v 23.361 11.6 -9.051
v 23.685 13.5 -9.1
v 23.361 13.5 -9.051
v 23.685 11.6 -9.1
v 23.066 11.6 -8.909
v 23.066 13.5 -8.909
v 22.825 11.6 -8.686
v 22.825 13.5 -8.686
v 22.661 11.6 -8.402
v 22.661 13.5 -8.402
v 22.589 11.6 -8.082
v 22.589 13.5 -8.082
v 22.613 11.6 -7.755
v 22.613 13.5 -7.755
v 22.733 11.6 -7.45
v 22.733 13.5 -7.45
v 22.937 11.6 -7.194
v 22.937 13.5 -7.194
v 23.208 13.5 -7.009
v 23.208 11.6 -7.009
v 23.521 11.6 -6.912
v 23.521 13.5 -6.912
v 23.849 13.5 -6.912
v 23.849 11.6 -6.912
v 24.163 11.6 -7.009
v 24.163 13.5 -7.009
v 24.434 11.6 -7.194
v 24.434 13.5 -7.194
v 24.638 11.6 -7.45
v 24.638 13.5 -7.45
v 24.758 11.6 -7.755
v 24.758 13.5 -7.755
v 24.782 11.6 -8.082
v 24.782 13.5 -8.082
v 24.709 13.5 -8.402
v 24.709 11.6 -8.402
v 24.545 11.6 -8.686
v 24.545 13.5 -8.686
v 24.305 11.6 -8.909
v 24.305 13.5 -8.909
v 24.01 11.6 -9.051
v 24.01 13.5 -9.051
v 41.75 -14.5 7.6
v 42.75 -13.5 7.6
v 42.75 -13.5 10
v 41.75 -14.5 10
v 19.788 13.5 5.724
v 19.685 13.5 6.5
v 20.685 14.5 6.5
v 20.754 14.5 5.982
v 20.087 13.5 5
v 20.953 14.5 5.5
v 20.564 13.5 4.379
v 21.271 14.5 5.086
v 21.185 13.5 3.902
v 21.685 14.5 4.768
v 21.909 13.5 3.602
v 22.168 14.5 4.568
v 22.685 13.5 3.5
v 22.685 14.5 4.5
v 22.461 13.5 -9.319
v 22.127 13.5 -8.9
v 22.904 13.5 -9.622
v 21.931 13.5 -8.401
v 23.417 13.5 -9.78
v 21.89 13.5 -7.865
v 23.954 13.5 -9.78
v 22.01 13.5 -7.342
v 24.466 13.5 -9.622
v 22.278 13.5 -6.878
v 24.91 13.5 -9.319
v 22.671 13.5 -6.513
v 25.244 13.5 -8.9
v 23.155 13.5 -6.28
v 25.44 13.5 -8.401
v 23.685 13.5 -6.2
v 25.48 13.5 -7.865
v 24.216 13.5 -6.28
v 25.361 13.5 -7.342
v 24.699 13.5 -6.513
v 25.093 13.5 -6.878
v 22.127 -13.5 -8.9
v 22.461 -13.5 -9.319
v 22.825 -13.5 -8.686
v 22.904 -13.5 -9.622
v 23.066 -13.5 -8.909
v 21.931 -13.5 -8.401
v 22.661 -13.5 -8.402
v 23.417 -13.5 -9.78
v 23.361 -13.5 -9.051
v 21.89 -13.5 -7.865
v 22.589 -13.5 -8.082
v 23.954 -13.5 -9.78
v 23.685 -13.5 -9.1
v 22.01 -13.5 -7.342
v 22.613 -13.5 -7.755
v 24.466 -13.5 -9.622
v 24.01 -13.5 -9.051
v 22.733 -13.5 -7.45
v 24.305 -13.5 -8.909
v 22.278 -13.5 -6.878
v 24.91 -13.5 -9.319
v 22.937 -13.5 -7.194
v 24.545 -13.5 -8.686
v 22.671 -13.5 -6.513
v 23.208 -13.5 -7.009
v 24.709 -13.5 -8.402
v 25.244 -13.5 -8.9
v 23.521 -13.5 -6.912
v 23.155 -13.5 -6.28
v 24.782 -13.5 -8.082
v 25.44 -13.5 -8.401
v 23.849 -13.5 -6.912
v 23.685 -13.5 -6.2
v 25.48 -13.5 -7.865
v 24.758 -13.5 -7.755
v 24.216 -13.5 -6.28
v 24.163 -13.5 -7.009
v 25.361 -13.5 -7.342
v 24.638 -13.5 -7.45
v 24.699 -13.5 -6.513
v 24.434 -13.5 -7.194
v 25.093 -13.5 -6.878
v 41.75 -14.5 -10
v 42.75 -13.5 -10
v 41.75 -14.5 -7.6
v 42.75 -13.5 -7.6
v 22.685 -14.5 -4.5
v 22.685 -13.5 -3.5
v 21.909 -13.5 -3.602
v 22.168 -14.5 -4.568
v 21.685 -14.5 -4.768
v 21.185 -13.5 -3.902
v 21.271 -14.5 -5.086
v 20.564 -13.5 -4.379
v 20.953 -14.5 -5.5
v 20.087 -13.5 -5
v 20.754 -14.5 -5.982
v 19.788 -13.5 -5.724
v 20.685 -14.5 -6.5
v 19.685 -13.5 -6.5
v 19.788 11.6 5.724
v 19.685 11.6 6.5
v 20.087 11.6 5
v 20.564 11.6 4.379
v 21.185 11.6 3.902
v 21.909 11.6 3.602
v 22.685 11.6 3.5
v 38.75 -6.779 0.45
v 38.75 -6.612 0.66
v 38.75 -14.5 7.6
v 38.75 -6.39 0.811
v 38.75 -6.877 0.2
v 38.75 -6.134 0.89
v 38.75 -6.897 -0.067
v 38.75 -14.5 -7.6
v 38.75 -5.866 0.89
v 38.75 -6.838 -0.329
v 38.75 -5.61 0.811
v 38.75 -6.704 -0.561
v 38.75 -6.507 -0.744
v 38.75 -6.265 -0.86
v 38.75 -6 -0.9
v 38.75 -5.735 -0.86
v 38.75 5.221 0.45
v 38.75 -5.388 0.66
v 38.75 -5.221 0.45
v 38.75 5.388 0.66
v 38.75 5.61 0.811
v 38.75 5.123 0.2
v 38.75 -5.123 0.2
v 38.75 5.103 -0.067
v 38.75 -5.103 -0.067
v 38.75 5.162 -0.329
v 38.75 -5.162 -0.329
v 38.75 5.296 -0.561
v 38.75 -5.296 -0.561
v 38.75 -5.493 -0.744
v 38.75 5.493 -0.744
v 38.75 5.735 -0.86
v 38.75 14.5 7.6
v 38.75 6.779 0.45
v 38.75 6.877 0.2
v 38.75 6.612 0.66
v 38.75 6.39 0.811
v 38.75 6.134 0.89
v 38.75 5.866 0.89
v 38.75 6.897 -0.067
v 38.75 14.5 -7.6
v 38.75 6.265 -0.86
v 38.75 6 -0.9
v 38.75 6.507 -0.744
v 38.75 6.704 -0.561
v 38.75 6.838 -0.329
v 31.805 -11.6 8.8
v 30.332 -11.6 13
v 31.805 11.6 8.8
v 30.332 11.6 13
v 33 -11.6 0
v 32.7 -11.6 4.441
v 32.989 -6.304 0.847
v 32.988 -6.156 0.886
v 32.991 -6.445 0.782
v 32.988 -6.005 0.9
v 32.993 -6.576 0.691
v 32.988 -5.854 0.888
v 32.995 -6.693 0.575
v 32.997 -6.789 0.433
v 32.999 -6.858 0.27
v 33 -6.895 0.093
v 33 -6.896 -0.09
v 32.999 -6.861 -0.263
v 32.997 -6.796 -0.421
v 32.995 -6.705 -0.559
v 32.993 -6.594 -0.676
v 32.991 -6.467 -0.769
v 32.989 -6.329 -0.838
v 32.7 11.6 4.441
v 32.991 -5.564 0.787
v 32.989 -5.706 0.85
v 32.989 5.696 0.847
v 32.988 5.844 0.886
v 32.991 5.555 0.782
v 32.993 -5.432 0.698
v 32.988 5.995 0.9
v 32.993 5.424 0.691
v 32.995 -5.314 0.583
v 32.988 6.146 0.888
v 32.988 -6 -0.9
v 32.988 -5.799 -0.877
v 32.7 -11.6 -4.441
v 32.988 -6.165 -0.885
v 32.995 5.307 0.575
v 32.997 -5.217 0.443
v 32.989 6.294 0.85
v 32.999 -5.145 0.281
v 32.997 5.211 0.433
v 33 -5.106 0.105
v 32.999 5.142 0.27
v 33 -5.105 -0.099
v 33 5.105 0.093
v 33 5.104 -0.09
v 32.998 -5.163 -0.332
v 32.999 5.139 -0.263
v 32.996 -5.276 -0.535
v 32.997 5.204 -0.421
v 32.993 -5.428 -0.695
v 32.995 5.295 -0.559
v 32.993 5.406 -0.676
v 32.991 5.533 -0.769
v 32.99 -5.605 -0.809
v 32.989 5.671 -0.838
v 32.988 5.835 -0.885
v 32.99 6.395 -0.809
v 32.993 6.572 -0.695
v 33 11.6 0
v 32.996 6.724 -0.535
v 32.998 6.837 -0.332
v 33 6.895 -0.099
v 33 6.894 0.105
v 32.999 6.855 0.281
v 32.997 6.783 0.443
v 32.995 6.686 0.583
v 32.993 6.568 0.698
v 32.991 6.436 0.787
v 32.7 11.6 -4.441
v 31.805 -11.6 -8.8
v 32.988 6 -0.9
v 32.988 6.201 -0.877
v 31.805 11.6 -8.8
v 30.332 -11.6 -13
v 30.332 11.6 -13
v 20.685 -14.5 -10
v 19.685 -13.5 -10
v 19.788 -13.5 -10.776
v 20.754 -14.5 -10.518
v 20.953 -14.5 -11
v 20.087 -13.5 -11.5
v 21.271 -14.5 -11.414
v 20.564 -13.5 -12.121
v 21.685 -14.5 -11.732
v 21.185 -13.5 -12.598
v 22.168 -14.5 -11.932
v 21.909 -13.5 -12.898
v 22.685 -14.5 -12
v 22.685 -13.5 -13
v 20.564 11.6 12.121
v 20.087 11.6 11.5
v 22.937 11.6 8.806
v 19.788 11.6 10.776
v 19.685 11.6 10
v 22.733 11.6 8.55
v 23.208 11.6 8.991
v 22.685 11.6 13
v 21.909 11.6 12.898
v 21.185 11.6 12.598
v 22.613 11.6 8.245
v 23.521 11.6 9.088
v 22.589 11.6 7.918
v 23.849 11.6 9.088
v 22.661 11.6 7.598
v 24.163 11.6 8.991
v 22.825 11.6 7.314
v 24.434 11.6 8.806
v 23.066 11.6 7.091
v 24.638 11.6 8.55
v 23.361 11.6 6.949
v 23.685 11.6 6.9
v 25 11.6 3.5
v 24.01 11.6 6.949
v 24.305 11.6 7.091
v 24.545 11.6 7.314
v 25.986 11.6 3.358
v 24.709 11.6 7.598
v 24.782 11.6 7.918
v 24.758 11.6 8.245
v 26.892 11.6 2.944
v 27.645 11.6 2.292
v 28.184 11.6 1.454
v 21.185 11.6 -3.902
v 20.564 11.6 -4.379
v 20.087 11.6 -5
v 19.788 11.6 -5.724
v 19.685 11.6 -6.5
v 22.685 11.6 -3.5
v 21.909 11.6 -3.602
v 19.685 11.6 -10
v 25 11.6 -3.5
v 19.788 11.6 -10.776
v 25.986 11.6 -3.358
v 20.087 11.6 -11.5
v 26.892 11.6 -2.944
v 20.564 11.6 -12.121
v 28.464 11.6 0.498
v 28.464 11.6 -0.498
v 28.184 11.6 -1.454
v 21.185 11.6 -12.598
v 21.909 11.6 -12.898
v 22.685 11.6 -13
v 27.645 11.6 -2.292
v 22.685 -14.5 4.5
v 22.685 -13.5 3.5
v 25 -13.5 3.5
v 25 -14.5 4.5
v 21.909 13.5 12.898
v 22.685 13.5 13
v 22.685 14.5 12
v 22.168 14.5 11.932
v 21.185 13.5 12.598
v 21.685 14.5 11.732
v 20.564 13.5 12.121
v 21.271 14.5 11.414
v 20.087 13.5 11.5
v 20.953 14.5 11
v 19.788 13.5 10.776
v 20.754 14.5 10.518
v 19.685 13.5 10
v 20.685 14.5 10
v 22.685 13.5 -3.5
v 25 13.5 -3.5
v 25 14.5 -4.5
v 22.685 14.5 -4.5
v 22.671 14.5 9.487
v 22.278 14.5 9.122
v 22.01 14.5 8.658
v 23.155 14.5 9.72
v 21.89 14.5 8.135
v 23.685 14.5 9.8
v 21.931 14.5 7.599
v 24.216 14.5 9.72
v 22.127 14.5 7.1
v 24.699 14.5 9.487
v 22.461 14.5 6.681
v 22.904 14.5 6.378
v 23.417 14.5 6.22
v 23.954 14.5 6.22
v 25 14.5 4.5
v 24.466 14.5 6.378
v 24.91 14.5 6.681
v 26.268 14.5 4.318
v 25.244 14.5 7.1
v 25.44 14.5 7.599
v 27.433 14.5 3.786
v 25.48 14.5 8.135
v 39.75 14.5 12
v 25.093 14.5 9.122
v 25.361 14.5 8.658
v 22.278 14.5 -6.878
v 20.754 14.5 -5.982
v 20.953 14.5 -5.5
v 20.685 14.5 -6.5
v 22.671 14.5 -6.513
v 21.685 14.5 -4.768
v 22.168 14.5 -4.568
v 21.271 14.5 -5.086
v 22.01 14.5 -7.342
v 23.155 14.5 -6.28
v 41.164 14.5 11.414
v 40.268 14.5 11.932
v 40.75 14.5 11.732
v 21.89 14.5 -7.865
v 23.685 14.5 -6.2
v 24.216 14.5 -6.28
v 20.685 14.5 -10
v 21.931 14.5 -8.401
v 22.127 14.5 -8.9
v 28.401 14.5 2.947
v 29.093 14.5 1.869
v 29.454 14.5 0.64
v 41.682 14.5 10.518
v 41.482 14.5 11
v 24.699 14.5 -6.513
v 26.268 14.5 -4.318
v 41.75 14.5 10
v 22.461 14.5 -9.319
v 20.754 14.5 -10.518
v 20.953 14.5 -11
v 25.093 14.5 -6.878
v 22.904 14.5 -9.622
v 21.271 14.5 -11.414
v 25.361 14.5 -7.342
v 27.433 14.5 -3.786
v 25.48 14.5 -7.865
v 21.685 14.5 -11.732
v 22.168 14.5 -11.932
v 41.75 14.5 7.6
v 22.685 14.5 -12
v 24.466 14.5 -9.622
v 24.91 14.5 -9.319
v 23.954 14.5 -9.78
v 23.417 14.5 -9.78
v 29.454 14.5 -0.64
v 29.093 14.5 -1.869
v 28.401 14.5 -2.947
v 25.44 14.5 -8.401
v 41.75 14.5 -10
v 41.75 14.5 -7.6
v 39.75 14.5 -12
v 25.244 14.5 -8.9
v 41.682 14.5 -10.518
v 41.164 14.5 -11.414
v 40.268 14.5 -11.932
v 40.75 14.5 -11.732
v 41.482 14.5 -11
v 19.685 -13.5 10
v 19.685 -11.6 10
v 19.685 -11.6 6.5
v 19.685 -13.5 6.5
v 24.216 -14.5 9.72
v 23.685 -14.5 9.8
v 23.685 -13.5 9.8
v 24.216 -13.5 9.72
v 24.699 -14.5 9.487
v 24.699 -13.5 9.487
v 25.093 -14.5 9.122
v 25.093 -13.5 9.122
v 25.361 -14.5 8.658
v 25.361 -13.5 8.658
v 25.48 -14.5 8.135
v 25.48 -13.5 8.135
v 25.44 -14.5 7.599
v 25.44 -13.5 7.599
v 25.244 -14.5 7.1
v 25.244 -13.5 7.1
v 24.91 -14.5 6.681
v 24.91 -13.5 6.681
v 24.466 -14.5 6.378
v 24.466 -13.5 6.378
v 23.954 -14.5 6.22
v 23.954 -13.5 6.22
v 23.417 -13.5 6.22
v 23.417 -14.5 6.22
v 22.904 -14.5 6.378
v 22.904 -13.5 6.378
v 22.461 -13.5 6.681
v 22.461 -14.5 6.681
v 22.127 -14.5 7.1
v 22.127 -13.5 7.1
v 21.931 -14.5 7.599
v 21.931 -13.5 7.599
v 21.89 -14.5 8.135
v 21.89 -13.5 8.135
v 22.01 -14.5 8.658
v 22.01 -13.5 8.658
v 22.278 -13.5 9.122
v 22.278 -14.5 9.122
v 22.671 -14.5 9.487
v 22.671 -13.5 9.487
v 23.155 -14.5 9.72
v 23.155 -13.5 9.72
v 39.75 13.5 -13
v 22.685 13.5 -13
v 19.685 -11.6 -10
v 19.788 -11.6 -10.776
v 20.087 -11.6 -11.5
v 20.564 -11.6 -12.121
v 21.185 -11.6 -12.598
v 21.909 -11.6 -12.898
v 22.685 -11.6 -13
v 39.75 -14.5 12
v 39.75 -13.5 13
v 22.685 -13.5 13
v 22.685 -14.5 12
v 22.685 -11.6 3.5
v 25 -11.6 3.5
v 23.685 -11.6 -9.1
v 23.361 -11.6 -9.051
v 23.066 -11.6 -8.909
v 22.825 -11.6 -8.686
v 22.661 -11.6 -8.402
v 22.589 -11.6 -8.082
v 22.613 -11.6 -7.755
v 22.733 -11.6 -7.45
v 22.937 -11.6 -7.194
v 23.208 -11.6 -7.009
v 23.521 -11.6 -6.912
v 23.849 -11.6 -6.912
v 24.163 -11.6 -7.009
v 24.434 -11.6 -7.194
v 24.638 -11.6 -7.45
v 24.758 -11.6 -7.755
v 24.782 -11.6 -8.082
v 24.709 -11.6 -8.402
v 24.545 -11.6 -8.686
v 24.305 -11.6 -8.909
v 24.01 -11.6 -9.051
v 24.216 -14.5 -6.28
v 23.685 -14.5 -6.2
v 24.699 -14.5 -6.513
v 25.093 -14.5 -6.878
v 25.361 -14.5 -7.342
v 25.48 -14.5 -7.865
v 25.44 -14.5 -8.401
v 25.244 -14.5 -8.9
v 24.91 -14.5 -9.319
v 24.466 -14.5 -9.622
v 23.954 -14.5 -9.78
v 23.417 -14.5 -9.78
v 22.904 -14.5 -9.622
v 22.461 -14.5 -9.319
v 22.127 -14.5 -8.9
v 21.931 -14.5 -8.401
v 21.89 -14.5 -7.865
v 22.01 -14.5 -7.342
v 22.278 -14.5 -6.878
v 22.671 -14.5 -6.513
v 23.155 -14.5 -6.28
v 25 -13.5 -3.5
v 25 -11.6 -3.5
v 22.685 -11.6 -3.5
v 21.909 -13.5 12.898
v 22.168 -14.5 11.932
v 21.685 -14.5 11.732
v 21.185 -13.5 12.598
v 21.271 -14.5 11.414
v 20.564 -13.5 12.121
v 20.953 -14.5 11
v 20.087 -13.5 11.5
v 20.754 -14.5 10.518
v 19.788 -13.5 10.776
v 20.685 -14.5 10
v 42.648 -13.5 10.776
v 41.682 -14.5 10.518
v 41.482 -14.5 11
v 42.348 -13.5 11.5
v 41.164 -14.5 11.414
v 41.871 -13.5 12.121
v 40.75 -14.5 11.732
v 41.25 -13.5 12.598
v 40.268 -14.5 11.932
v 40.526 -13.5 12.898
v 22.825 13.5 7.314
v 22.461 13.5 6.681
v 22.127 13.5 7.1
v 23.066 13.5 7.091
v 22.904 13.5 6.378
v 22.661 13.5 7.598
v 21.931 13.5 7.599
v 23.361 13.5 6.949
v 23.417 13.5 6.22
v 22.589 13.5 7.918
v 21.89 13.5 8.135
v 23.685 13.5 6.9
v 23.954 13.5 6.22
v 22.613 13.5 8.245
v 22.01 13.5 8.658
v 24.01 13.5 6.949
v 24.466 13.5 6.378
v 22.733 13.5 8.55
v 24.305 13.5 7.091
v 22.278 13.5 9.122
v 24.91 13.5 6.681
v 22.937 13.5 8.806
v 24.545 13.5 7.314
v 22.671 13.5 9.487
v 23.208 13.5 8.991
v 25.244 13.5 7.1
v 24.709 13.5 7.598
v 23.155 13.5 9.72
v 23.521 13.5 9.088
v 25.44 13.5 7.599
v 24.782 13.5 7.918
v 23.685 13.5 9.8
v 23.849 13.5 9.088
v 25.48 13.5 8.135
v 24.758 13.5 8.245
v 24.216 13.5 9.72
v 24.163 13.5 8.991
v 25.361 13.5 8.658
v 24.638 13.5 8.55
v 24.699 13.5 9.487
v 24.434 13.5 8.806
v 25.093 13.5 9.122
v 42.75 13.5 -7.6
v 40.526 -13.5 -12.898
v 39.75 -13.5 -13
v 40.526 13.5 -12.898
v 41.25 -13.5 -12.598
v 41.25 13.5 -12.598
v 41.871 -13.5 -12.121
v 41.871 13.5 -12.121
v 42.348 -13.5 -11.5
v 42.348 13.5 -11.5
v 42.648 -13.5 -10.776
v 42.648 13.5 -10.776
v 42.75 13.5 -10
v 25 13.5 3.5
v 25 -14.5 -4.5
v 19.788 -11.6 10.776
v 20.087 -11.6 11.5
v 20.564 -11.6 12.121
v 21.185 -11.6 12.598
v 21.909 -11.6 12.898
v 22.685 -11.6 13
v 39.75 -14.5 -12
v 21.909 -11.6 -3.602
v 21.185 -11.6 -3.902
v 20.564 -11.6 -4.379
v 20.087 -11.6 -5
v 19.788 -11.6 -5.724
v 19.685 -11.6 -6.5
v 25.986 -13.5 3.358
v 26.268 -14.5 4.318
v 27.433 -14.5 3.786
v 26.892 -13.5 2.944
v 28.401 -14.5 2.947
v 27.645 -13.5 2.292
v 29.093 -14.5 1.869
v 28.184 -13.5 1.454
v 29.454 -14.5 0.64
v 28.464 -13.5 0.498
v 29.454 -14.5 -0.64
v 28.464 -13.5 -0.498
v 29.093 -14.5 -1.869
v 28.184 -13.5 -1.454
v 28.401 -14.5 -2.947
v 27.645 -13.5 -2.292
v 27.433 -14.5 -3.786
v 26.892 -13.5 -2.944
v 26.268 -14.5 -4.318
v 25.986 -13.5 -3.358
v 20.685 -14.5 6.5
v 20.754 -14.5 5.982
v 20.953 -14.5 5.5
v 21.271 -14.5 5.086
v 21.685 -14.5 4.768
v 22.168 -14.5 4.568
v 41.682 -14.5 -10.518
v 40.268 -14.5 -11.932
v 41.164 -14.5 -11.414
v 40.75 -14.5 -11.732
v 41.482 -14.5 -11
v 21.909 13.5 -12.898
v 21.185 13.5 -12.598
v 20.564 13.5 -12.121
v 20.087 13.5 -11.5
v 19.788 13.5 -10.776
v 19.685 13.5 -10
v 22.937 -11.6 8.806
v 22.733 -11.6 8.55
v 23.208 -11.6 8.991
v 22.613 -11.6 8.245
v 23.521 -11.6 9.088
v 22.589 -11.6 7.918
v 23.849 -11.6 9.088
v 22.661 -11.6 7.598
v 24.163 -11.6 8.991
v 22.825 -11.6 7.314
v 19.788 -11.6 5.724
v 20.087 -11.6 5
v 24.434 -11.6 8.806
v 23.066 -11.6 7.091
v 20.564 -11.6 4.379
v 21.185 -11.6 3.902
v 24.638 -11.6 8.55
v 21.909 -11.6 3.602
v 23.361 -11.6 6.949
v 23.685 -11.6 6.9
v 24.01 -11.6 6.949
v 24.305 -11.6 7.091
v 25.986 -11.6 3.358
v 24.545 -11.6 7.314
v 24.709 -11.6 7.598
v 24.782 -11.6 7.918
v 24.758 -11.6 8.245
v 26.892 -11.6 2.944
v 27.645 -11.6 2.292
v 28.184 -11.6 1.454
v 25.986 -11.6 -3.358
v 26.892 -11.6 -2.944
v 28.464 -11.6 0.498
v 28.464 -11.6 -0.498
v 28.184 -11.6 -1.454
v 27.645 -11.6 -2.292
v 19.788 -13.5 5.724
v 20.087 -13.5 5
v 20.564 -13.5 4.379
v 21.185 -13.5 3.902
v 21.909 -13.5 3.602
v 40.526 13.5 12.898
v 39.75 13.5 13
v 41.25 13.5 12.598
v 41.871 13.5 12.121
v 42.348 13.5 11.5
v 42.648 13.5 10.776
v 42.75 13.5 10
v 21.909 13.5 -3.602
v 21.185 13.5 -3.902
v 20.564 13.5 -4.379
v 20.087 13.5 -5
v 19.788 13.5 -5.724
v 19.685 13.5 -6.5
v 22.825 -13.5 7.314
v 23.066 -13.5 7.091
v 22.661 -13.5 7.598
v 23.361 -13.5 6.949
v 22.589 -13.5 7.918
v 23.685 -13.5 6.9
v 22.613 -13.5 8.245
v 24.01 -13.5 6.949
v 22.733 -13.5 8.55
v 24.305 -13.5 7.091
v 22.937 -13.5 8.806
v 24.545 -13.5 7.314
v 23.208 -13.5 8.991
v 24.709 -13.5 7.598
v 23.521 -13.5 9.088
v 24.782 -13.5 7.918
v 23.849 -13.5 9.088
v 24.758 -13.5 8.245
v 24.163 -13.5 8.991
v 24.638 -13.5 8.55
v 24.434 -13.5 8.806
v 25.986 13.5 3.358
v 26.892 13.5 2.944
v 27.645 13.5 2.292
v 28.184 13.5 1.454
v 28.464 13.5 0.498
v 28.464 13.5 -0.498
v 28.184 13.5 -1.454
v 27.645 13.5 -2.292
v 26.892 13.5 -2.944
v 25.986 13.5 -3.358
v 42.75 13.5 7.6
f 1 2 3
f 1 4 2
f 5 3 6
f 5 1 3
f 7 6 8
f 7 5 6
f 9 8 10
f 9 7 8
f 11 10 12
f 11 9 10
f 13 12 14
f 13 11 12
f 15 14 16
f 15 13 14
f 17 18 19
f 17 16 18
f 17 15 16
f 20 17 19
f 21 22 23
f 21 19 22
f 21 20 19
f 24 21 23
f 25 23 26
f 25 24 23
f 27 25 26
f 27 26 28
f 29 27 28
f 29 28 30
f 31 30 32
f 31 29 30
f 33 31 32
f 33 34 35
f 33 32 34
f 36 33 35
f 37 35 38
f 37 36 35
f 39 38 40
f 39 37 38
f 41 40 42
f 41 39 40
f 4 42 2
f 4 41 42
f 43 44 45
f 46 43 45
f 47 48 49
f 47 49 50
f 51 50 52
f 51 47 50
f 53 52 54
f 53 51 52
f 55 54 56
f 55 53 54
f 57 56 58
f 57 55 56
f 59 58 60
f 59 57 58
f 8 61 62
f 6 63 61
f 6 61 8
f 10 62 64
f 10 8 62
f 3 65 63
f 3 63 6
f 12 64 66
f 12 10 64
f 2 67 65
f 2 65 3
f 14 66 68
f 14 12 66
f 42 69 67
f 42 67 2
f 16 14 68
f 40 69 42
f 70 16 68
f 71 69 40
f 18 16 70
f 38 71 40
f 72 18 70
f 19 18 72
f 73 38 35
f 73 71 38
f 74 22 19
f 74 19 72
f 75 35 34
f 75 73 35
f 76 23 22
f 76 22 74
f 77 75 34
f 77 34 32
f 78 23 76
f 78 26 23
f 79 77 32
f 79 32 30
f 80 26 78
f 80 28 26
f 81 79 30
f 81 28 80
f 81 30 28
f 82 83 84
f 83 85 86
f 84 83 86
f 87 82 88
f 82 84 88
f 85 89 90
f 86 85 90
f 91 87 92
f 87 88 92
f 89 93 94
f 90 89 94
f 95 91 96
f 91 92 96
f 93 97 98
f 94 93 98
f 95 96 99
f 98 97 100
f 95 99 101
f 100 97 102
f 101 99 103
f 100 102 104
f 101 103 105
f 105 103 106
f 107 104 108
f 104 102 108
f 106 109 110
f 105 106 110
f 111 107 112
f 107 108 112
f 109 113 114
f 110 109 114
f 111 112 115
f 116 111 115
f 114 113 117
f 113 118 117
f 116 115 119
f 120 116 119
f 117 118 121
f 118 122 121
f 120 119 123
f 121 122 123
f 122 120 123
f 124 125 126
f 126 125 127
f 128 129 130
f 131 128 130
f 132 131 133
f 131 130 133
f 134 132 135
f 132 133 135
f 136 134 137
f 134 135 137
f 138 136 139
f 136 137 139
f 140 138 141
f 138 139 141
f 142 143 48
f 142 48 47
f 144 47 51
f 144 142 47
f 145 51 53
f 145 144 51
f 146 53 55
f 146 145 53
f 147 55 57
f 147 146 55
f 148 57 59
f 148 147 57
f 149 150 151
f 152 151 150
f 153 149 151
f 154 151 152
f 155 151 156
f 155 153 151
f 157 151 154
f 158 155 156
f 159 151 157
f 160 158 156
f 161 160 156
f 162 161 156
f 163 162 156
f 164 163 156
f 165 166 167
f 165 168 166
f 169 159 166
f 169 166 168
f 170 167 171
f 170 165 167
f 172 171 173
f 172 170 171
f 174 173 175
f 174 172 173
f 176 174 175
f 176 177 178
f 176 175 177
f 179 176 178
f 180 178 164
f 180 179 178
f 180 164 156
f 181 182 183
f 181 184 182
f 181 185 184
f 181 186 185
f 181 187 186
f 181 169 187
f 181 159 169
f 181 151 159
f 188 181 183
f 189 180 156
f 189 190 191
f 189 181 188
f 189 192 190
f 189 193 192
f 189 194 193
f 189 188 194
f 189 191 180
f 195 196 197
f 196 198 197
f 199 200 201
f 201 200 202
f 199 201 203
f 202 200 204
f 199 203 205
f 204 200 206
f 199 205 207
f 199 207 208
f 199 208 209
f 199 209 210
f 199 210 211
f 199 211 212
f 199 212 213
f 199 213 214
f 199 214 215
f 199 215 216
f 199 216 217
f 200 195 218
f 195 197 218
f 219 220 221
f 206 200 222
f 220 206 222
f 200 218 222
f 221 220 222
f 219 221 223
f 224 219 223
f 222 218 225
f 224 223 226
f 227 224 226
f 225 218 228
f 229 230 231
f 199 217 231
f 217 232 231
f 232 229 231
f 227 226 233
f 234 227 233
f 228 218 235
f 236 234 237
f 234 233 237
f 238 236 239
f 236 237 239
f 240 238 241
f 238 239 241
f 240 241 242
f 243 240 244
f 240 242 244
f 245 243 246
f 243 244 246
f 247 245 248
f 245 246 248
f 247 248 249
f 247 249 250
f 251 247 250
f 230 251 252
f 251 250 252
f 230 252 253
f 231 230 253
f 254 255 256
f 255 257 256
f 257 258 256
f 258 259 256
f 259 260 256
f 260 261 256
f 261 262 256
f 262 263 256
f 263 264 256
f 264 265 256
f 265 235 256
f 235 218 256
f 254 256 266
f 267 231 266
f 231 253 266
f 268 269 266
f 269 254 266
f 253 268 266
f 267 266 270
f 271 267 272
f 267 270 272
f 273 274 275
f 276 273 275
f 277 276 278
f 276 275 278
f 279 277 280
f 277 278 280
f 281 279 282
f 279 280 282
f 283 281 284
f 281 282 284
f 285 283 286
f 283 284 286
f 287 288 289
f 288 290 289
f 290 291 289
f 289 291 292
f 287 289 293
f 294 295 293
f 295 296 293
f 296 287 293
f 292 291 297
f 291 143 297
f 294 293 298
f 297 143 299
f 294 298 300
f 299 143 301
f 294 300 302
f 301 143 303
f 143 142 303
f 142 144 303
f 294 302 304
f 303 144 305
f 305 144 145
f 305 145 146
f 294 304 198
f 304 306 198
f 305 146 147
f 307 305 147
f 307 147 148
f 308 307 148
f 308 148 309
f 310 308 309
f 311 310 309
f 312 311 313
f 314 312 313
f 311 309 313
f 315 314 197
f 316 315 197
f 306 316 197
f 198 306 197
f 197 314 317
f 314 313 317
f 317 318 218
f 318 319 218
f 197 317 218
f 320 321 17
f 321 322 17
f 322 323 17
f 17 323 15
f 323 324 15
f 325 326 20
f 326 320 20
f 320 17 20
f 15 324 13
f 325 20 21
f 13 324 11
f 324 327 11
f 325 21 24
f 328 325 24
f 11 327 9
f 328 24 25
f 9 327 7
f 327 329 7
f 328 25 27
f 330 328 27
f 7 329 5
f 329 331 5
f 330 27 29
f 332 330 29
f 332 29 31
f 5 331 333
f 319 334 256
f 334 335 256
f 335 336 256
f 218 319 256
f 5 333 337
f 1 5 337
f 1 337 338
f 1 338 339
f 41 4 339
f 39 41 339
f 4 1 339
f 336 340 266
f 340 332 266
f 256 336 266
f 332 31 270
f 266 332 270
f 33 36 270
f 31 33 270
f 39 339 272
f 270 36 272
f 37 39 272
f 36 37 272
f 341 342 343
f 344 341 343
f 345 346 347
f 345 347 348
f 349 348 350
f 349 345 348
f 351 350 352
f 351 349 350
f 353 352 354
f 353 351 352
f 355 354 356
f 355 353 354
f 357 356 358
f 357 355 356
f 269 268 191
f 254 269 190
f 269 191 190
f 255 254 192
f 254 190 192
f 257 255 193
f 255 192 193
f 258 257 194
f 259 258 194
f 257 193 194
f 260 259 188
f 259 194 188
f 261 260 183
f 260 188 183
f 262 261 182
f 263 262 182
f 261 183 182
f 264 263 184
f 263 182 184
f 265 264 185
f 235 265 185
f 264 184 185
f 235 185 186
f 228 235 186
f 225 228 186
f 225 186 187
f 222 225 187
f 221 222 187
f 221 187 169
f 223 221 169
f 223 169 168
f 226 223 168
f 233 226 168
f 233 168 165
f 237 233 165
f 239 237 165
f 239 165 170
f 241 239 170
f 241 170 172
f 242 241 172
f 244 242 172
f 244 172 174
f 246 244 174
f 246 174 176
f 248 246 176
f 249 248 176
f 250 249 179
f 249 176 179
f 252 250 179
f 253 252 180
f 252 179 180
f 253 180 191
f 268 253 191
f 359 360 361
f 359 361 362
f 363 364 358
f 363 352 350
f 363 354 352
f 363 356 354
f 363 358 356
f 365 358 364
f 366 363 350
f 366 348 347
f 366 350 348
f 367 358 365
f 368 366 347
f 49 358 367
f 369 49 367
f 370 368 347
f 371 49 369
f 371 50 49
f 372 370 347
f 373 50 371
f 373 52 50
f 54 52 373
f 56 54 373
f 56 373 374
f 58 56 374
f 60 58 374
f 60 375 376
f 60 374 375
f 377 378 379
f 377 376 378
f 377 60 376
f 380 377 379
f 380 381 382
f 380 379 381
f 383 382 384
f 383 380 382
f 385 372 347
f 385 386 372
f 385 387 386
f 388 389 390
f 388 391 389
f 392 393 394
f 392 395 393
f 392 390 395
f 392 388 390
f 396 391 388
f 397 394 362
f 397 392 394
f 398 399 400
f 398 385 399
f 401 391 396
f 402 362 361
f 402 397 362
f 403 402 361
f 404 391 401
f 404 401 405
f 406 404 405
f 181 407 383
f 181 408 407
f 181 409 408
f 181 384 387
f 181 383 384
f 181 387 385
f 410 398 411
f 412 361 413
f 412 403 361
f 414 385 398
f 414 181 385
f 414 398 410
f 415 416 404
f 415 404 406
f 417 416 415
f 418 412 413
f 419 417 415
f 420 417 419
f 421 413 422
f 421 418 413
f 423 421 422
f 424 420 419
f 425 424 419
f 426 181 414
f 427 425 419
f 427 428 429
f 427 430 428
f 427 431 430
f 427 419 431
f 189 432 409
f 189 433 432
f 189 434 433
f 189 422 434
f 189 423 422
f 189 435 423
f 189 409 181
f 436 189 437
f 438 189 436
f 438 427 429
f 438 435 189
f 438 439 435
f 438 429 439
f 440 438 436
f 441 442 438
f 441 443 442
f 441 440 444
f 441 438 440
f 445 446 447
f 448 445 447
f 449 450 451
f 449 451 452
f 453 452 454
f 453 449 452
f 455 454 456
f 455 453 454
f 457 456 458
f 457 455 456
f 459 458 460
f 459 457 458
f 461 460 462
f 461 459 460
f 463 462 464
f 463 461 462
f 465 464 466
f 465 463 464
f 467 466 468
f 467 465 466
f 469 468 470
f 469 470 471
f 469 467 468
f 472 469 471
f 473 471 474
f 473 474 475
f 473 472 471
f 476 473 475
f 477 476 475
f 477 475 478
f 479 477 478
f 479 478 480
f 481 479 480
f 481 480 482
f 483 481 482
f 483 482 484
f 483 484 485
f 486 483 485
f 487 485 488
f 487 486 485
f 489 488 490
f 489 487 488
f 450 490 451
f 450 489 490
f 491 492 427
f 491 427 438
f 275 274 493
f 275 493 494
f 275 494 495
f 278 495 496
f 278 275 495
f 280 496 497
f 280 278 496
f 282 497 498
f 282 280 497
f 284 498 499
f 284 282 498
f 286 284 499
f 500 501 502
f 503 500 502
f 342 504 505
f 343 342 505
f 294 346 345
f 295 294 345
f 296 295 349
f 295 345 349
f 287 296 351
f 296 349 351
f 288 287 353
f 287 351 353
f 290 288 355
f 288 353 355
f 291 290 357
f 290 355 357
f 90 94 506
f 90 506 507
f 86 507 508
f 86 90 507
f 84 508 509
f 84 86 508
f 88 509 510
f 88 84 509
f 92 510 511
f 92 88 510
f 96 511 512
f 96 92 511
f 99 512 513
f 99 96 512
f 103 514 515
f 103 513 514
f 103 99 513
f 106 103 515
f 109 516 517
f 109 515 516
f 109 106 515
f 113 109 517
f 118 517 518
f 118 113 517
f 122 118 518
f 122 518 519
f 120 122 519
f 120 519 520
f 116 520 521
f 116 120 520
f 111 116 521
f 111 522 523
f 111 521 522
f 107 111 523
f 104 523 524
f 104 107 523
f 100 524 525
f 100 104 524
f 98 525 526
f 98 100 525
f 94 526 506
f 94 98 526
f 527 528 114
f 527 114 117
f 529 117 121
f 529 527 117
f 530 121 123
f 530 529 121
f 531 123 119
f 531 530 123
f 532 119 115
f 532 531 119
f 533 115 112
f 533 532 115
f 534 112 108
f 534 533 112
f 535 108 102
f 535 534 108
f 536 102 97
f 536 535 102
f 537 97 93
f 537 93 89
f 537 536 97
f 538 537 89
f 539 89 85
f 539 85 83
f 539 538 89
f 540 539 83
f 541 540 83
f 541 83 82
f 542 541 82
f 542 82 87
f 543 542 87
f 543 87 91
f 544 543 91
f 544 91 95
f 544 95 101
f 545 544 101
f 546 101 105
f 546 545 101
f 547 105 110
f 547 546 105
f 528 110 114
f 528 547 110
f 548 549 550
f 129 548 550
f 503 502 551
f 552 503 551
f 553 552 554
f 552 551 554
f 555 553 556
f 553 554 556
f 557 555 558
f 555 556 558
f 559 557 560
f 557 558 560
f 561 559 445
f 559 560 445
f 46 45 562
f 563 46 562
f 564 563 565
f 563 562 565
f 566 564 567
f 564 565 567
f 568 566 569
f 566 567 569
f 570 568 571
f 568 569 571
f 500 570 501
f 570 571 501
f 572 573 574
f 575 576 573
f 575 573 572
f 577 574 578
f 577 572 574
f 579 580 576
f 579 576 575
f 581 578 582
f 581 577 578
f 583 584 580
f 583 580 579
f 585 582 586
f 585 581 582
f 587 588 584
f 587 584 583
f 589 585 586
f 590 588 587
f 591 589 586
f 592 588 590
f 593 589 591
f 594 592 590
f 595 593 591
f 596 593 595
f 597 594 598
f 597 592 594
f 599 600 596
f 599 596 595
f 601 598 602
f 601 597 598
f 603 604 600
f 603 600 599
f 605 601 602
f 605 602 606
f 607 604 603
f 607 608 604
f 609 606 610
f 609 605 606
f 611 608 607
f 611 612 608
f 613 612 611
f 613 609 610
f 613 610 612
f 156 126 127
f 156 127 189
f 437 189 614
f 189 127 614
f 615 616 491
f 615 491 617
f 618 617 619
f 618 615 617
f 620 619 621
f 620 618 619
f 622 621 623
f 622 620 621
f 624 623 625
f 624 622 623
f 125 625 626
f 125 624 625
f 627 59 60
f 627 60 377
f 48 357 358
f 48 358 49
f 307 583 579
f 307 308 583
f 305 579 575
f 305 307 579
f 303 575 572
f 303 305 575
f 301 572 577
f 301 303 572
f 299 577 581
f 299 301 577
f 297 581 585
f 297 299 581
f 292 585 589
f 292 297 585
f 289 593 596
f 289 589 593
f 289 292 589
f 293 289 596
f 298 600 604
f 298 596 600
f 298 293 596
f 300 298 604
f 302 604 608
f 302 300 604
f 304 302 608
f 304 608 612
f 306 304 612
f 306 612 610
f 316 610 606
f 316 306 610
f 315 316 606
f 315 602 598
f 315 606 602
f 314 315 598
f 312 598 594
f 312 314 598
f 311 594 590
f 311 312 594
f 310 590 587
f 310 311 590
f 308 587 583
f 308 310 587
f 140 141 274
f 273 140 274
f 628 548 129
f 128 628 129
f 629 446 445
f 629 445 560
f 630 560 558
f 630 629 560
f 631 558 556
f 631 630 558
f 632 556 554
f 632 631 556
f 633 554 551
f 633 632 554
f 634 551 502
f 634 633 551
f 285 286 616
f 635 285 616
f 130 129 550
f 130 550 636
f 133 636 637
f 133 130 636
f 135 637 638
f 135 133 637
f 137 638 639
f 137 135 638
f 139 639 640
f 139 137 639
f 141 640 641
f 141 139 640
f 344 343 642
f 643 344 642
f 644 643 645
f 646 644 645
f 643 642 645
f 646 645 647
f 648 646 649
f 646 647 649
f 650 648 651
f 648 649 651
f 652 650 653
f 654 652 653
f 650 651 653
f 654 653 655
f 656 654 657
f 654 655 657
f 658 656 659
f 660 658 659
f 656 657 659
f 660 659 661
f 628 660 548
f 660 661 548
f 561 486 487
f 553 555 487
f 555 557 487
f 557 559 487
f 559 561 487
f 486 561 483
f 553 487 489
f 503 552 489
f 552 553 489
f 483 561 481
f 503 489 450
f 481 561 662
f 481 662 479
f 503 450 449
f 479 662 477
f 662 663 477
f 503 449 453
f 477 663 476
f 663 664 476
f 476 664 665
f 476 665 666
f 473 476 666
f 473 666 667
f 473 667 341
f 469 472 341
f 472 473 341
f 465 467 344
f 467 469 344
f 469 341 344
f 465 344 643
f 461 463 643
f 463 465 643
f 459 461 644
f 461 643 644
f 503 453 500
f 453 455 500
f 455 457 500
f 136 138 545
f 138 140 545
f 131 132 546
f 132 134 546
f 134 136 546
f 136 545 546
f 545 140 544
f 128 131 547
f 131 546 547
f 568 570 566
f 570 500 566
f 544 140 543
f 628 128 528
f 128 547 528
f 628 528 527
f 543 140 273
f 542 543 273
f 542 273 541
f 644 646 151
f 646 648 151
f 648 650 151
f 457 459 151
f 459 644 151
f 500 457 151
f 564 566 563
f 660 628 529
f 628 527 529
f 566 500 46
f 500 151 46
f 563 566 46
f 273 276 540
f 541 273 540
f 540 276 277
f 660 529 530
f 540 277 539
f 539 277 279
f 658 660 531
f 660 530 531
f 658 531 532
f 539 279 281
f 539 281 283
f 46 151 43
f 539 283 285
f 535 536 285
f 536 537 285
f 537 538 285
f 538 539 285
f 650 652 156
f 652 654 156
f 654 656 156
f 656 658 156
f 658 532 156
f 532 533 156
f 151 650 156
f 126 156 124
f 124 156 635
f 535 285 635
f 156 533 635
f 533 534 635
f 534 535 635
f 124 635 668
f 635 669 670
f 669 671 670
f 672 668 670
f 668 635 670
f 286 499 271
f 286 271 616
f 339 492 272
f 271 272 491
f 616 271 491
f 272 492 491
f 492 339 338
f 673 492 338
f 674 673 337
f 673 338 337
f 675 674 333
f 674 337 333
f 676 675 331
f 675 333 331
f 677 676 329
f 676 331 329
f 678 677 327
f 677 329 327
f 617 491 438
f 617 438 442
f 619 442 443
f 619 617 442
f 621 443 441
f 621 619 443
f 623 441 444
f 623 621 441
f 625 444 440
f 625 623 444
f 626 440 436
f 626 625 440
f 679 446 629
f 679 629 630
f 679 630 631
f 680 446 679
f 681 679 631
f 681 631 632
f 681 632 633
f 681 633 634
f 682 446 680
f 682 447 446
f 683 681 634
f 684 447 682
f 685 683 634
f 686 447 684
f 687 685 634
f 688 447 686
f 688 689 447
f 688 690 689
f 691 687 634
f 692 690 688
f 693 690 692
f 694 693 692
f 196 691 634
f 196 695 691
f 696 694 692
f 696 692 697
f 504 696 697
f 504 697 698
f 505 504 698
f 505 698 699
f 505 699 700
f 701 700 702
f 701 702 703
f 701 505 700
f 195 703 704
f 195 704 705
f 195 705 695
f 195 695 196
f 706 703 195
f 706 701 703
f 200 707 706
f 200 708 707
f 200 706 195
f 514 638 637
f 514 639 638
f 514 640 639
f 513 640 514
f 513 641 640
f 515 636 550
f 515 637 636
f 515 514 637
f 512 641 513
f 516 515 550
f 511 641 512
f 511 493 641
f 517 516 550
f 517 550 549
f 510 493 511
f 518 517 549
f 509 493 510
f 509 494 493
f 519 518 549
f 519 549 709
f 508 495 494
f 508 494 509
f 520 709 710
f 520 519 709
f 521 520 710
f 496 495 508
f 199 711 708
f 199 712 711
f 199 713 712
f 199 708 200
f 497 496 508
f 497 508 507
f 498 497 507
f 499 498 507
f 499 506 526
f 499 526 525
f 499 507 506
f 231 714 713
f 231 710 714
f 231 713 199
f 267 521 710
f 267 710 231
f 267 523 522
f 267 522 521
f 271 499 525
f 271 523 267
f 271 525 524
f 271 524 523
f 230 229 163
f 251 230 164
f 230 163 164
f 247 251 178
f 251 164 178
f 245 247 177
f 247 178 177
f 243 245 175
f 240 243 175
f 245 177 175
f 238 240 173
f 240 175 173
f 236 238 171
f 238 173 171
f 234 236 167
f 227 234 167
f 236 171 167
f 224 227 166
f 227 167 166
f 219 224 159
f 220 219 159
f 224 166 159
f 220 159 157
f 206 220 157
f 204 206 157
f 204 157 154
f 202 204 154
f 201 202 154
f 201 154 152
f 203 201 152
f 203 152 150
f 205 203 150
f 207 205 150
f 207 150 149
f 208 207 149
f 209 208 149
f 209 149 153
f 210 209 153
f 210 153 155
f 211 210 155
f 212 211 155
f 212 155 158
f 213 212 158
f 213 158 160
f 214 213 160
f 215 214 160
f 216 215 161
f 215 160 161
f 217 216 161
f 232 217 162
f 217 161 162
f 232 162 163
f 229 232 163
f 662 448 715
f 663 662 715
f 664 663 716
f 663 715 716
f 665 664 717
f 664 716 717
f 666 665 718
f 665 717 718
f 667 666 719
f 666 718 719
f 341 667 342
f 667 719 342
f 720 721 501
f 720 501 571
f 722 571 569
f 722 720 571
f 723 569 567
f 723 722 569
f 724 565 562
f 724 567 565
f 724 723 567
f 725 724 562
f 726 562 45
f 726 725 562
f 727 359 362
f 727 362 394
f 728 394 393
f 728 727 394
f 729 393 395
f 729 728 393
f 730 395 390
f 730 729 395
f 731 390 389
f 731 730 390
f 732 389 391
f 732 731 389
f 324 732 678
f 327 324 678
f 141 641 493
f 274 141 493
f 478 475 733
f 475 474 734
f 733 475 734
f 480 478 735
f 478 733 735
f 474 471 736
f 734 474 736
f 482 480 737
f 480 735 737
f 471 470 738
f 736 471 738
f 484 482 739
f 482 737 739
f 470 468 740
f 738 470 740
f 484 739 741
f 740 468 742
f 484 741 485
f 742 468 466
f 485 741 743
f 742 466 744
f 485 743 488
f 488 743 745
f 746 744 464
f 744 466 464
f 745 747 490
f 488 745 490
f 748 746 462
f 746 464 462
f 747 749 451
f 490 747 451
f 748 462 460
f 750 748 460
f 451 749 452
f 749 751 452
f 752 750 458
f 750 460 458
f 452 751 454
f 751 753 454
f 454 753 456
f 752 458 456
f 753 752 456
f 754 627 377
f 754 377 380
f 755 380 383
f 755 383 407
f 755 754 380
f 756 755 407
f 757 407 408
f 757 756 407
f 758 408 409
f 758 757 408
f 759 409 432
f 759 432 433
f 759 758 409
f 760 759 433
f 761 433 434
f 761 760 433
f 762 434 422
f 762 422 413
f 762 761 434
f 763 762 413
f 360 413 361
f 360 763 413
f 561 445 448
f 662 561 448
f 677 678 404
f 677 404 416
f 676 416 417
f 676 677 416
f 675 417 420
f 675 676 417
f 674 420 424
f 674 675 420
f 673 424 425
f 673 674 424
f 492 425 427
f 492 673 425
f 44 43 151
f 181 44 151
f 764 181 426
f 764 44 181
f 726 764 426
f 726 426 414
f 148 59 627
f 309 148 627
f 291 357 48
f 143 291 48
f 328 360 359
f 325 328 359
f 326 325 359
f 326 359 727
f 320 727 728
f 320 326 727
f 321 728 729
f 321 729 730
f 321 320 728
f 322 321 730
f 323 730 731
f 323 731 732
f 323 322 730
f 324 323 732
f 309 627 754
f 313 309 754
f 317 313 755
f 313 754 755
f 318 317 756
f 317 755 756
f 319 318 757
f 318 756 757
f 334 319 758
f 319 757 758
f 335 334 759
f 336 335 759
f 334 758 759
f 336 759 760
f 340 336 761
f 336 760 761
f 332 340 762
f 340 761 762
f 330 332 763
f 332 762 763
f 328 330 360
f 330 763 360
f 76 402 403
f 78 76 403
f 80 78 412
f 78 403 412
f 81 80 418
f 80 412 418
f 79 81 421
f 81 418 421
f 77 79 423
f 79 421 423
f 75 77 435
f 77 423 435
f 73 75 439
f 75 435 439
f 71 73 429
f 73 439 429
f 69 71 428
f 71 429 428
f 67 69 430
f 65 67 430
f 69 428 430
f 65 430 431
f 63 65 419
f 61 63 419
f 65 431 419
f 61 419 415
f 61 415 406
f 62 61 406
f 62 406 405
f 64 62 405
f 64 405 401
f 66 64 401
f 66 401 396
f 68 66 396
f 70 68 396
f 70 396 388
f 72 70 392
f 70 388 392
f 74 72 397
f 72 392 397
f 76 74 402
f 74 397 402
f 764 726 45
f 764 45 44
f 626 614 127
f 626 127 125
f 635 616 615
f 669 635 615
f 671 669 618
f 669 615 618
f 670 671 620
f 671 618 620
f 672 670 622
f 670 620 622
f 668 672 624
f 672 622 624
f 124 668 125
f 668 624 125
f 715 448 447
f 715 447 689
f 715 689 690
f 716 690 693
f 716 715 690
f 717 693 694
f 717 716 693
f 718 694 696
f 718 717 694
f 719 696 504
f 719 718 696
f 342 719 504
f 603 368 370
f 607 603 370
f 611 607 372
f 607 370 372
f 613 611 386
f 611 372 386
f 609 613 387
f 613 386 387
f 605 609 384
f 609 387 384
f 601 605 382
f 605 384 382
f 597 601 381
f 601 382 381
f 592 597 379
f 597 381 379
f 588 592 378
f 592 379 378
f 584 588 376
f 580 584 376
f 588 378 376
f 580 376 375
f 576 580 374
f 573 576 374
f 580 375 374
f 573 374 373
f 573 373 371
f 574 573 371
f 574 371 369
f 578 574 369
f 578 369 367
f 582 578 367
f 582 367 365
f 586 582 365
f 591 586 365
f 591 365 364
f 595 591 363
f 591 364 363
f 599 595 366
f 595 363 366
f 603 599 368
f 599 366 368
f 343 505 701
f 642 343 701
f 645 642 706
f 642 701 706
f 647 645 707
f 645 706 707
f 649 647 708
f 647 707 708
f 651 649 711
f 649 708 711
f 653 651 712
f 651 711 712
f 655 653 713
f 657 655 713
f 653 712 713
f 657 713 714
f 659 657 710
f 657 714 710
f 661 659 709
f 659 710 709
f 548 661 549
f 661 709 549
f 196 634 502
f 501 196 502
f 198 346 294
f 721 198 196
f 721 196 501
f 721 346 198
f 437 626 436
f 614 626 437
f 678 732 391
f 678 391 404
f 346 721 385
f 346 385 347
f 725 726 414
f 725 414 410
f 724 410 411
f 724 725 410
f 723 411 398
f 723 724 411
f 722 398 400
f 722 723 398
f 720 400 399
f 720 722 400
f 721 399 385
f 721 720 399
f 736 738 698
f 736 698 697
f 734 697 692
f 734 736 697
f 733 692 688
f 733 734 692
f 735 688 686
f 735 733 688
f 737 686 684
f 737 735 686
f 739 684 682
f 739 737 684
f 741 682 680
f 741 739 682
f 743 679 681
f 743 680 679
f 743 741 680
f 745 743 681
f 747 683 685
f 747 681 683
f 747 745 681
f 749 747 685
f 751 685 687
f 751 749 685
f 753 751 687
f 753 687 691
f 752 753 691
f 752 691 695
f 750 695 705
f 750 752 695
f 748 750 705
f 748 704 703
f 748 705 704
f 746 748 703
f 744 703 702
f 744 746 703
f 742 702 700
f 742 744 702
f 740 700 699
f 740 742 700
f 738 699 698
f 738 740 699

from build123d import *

# Parameters (mm, degrees)
SKETCH_2_W          = 23.064561435
SKETCH_2_H          = 26
SKETCH_2_R          = 1.1
EXTRUDE_1_DEPTH     = 14.5
SKETCH_3_R          = 33
CUT_EXTRUDE_1_DEPTH = 11.6
SKETCH_4_R          = 3.5
CUT_EXTRUDE_2_DEPTH = 54.268776032
SKETCH_5_W          = 15.2
SKETCH_5_H          = 29
CUT_EXTRUDE_3_DEPTH = 4
FILLET_1_R          = 3
SKETCH_6_R          = 0.9
CUT_EXTRUDE_4_DEPTH = 28.252660471
CHAMFER_1_SIZE      = 1
SKETCH_7_R          = 1.8
CUT_EXTRUDE_5_DEPTH = 1


with BuildPart() as part:
    # Эскиз2 → Бобышка-Вытянуть1 (new, symmetric)
    with BuildSketch(Plane(origin=(0, 0, 0), x_dir=(1, 0, 0), z_dir=(0, 1, 0))):
        with Locations((31.217719282, 0)):
            Rectangle(SKETCH_2_W, SKETCH_2_H)
        with Locations(Location((23.685438565, 8, 0), (0, 0, 90))):
            Circle(SKETCH_2_R, mode=Mode.SUBTRACT)
        with Locations(Location((23.685438565, -8, 0), (0, 0, 90))):
            Circle(SKETCH_2_R, mode=Mode.SUBTRACT)
    extrude(amount=EXTRUDE_1_DEPTH, both=True)

    # Эскиз3 → Вырез-Вытянуть1 (cut, symmetric)
    with BuildSketch(Plane(origin=(0, 0, 0), x_dir=(1, 0, 0), z_dir=(0, 1, 0))):
        Circle(SKETCH_3_R)
    extrude(amount=CUT_EXTRUDE_1_DEPTH, both=True, mode=Mode.SUBTRACT)

    # Эскиз4 → Вырез-Вытянуть2 (cut, through all)
    with BuildSketch(Plane(origin=(0, 14.5, 0), x_dir=(1, 0, 0), z_dir=(0, 1, 0))):
        with Locations((25, 0)):
            Circle(SKETCH_4_R)
        with BuildLine():
            ThreePointArc((25, -3.5), (21.5, 0), (25, 3.5))
            Line((25, 3.5), (19.685438565, 3.5))
            Line((19.685438565, 3.5), (19.685438565, -3.5))
            Line((19.685438565, -3.5), (25, -3.5))
        make_face()
    extrude(amount=-CUT_EXTRUDE_2_DEPTH, mode=Mode.SUBTRACT)

    # Эскиз5 → Вырез-Вытянуть3 (cut)
    with BuildSketch(Plane(origin=(42.75, 0, 0), x_dir=(0, 0, -1), z_dir=(1, 0, 0))):
        Rectangle(SKETCH_5_W, SKETCH_5_H)
    extrude(amount=-CUT_EXTRUDE_3_DEPTH, mode=Mode.SUBTRACT)

    # Скругление1
    fillet_1_edges = [part.edges().sort_by_distance(p)[0] for p in [
        (19.685438565, -13.05, 13),
        (19.685438565, -13.05, -13),
        (19.685438565, 13.05, 3.5),
        (19.685438565, 13.05, -3.5),
        (19.685438565, -13.05, 3.5),
        (19.685438565, -13.05, -3.5),
        (42.75, 0, 13),
        (19.685438565, 13.05, 13),
        (19.685438565, 13.05, -13),
        (42.75, 0, -13),
    ]]
    fillet(fillet_1_edges, radius=FILLET_1_R)

    # Эскиз6 → Вырез-Вытянуть4 (cut, through all)
    with BuildSketch(Plane(origin=(38.75, 0, 0), x_dir=(0, 0, -1), z_dir=(1, 0, 0))):
        with Locations((0, 6)):
            Circle(SKETCH_6_R)
        with Locations((0, -6)):
            Circle(SKETCH_6_R)
    extrude(amount=-CUT_EXTRUDE_4_DEPTH, mode=Mode.SUBTRACT)

    # Фаска1
    chamfer_1_edges = [part.edges().sort_by_distance(p)[0] for p in [
        (20.564118221, 14.5, 12.121320344),
        (20.564118221, 14.5, 4.378679656),
        (20.564118221, 14.5, -4.378679656),
        (20.564118221, 14.5, -12.121320344),
        (41.871320344, 14.5, -12.121320344),
        (28.5, -14.5, 0),
        (23.842719282, -14.5, -3.5),
        (28.5, 14.5, 0),
        (23.842719282, 14.5, -3.5),
        (42.75, -14.5, -8.8),
        (42.75, 14.5, -8.8),
        (31.217719282, 14.5, -13),
        (31.217719282, -14.5, -13),
        (42.75, -14.5, 8.8),
        (31.217719282, -14.5, 13),
        (19.685438565, -14.5, 8.25),
        (23.842719282, -14.5, 3.5),
        (19.685438565, -14.5, -8.25),
        (41.871320344, -14.5, 12.121320344),
        (20.564118221, -14.5, 12.121320344),
        (20.564118221, -14.5, 4.378679656),
        (20.564118221, -14.5, -4.378679656),
        (20.564118221, -14.5, -12.121320344),
        (41.871320344, -14.5, -12.121320344),
        (19.685438565, 14.5, -8.25),
        (23.842719282, 14.5, 3.5),
        (19.685438565, 14.5, 8.25),
        (31.217719282, 14.5, 13),
        (42.75, 14.5, 8.8),
        (41.871320344, 14.5, 12.121320344),
    ]]
    chamfer(chamfer_1_edges, length=CHAMFER_1_SIZE)

    # Эскиз7 → Вырез-Вытянуть5 (cut)
    with BuildSketch(Plane(origin=(0, 14.5, 0), x_dir=(1, 0, 0), z_dir=(0, 1, 0))):
        with Locations(Location((23.685438565, 8, 0), (0, 0, 270))):
            Circle(SKETCH_7_R)
        with Locations(Location((23.685438565, -8, 0), (0, 0, 270))):
            Circle(SKETCH_7_R)
    cut_extrude_5 = extrude(amount=-CUT_EXTRUDE_5_DEPTH, mode=Mode.SUBTRACT)

    # Зеркальное отражение1: Вырез-Вытянуть5 across plane
    add(cut_extrude_5.mirror(Plane.ZX), mode=Mode.SUBTRACT)


solid = part.part
